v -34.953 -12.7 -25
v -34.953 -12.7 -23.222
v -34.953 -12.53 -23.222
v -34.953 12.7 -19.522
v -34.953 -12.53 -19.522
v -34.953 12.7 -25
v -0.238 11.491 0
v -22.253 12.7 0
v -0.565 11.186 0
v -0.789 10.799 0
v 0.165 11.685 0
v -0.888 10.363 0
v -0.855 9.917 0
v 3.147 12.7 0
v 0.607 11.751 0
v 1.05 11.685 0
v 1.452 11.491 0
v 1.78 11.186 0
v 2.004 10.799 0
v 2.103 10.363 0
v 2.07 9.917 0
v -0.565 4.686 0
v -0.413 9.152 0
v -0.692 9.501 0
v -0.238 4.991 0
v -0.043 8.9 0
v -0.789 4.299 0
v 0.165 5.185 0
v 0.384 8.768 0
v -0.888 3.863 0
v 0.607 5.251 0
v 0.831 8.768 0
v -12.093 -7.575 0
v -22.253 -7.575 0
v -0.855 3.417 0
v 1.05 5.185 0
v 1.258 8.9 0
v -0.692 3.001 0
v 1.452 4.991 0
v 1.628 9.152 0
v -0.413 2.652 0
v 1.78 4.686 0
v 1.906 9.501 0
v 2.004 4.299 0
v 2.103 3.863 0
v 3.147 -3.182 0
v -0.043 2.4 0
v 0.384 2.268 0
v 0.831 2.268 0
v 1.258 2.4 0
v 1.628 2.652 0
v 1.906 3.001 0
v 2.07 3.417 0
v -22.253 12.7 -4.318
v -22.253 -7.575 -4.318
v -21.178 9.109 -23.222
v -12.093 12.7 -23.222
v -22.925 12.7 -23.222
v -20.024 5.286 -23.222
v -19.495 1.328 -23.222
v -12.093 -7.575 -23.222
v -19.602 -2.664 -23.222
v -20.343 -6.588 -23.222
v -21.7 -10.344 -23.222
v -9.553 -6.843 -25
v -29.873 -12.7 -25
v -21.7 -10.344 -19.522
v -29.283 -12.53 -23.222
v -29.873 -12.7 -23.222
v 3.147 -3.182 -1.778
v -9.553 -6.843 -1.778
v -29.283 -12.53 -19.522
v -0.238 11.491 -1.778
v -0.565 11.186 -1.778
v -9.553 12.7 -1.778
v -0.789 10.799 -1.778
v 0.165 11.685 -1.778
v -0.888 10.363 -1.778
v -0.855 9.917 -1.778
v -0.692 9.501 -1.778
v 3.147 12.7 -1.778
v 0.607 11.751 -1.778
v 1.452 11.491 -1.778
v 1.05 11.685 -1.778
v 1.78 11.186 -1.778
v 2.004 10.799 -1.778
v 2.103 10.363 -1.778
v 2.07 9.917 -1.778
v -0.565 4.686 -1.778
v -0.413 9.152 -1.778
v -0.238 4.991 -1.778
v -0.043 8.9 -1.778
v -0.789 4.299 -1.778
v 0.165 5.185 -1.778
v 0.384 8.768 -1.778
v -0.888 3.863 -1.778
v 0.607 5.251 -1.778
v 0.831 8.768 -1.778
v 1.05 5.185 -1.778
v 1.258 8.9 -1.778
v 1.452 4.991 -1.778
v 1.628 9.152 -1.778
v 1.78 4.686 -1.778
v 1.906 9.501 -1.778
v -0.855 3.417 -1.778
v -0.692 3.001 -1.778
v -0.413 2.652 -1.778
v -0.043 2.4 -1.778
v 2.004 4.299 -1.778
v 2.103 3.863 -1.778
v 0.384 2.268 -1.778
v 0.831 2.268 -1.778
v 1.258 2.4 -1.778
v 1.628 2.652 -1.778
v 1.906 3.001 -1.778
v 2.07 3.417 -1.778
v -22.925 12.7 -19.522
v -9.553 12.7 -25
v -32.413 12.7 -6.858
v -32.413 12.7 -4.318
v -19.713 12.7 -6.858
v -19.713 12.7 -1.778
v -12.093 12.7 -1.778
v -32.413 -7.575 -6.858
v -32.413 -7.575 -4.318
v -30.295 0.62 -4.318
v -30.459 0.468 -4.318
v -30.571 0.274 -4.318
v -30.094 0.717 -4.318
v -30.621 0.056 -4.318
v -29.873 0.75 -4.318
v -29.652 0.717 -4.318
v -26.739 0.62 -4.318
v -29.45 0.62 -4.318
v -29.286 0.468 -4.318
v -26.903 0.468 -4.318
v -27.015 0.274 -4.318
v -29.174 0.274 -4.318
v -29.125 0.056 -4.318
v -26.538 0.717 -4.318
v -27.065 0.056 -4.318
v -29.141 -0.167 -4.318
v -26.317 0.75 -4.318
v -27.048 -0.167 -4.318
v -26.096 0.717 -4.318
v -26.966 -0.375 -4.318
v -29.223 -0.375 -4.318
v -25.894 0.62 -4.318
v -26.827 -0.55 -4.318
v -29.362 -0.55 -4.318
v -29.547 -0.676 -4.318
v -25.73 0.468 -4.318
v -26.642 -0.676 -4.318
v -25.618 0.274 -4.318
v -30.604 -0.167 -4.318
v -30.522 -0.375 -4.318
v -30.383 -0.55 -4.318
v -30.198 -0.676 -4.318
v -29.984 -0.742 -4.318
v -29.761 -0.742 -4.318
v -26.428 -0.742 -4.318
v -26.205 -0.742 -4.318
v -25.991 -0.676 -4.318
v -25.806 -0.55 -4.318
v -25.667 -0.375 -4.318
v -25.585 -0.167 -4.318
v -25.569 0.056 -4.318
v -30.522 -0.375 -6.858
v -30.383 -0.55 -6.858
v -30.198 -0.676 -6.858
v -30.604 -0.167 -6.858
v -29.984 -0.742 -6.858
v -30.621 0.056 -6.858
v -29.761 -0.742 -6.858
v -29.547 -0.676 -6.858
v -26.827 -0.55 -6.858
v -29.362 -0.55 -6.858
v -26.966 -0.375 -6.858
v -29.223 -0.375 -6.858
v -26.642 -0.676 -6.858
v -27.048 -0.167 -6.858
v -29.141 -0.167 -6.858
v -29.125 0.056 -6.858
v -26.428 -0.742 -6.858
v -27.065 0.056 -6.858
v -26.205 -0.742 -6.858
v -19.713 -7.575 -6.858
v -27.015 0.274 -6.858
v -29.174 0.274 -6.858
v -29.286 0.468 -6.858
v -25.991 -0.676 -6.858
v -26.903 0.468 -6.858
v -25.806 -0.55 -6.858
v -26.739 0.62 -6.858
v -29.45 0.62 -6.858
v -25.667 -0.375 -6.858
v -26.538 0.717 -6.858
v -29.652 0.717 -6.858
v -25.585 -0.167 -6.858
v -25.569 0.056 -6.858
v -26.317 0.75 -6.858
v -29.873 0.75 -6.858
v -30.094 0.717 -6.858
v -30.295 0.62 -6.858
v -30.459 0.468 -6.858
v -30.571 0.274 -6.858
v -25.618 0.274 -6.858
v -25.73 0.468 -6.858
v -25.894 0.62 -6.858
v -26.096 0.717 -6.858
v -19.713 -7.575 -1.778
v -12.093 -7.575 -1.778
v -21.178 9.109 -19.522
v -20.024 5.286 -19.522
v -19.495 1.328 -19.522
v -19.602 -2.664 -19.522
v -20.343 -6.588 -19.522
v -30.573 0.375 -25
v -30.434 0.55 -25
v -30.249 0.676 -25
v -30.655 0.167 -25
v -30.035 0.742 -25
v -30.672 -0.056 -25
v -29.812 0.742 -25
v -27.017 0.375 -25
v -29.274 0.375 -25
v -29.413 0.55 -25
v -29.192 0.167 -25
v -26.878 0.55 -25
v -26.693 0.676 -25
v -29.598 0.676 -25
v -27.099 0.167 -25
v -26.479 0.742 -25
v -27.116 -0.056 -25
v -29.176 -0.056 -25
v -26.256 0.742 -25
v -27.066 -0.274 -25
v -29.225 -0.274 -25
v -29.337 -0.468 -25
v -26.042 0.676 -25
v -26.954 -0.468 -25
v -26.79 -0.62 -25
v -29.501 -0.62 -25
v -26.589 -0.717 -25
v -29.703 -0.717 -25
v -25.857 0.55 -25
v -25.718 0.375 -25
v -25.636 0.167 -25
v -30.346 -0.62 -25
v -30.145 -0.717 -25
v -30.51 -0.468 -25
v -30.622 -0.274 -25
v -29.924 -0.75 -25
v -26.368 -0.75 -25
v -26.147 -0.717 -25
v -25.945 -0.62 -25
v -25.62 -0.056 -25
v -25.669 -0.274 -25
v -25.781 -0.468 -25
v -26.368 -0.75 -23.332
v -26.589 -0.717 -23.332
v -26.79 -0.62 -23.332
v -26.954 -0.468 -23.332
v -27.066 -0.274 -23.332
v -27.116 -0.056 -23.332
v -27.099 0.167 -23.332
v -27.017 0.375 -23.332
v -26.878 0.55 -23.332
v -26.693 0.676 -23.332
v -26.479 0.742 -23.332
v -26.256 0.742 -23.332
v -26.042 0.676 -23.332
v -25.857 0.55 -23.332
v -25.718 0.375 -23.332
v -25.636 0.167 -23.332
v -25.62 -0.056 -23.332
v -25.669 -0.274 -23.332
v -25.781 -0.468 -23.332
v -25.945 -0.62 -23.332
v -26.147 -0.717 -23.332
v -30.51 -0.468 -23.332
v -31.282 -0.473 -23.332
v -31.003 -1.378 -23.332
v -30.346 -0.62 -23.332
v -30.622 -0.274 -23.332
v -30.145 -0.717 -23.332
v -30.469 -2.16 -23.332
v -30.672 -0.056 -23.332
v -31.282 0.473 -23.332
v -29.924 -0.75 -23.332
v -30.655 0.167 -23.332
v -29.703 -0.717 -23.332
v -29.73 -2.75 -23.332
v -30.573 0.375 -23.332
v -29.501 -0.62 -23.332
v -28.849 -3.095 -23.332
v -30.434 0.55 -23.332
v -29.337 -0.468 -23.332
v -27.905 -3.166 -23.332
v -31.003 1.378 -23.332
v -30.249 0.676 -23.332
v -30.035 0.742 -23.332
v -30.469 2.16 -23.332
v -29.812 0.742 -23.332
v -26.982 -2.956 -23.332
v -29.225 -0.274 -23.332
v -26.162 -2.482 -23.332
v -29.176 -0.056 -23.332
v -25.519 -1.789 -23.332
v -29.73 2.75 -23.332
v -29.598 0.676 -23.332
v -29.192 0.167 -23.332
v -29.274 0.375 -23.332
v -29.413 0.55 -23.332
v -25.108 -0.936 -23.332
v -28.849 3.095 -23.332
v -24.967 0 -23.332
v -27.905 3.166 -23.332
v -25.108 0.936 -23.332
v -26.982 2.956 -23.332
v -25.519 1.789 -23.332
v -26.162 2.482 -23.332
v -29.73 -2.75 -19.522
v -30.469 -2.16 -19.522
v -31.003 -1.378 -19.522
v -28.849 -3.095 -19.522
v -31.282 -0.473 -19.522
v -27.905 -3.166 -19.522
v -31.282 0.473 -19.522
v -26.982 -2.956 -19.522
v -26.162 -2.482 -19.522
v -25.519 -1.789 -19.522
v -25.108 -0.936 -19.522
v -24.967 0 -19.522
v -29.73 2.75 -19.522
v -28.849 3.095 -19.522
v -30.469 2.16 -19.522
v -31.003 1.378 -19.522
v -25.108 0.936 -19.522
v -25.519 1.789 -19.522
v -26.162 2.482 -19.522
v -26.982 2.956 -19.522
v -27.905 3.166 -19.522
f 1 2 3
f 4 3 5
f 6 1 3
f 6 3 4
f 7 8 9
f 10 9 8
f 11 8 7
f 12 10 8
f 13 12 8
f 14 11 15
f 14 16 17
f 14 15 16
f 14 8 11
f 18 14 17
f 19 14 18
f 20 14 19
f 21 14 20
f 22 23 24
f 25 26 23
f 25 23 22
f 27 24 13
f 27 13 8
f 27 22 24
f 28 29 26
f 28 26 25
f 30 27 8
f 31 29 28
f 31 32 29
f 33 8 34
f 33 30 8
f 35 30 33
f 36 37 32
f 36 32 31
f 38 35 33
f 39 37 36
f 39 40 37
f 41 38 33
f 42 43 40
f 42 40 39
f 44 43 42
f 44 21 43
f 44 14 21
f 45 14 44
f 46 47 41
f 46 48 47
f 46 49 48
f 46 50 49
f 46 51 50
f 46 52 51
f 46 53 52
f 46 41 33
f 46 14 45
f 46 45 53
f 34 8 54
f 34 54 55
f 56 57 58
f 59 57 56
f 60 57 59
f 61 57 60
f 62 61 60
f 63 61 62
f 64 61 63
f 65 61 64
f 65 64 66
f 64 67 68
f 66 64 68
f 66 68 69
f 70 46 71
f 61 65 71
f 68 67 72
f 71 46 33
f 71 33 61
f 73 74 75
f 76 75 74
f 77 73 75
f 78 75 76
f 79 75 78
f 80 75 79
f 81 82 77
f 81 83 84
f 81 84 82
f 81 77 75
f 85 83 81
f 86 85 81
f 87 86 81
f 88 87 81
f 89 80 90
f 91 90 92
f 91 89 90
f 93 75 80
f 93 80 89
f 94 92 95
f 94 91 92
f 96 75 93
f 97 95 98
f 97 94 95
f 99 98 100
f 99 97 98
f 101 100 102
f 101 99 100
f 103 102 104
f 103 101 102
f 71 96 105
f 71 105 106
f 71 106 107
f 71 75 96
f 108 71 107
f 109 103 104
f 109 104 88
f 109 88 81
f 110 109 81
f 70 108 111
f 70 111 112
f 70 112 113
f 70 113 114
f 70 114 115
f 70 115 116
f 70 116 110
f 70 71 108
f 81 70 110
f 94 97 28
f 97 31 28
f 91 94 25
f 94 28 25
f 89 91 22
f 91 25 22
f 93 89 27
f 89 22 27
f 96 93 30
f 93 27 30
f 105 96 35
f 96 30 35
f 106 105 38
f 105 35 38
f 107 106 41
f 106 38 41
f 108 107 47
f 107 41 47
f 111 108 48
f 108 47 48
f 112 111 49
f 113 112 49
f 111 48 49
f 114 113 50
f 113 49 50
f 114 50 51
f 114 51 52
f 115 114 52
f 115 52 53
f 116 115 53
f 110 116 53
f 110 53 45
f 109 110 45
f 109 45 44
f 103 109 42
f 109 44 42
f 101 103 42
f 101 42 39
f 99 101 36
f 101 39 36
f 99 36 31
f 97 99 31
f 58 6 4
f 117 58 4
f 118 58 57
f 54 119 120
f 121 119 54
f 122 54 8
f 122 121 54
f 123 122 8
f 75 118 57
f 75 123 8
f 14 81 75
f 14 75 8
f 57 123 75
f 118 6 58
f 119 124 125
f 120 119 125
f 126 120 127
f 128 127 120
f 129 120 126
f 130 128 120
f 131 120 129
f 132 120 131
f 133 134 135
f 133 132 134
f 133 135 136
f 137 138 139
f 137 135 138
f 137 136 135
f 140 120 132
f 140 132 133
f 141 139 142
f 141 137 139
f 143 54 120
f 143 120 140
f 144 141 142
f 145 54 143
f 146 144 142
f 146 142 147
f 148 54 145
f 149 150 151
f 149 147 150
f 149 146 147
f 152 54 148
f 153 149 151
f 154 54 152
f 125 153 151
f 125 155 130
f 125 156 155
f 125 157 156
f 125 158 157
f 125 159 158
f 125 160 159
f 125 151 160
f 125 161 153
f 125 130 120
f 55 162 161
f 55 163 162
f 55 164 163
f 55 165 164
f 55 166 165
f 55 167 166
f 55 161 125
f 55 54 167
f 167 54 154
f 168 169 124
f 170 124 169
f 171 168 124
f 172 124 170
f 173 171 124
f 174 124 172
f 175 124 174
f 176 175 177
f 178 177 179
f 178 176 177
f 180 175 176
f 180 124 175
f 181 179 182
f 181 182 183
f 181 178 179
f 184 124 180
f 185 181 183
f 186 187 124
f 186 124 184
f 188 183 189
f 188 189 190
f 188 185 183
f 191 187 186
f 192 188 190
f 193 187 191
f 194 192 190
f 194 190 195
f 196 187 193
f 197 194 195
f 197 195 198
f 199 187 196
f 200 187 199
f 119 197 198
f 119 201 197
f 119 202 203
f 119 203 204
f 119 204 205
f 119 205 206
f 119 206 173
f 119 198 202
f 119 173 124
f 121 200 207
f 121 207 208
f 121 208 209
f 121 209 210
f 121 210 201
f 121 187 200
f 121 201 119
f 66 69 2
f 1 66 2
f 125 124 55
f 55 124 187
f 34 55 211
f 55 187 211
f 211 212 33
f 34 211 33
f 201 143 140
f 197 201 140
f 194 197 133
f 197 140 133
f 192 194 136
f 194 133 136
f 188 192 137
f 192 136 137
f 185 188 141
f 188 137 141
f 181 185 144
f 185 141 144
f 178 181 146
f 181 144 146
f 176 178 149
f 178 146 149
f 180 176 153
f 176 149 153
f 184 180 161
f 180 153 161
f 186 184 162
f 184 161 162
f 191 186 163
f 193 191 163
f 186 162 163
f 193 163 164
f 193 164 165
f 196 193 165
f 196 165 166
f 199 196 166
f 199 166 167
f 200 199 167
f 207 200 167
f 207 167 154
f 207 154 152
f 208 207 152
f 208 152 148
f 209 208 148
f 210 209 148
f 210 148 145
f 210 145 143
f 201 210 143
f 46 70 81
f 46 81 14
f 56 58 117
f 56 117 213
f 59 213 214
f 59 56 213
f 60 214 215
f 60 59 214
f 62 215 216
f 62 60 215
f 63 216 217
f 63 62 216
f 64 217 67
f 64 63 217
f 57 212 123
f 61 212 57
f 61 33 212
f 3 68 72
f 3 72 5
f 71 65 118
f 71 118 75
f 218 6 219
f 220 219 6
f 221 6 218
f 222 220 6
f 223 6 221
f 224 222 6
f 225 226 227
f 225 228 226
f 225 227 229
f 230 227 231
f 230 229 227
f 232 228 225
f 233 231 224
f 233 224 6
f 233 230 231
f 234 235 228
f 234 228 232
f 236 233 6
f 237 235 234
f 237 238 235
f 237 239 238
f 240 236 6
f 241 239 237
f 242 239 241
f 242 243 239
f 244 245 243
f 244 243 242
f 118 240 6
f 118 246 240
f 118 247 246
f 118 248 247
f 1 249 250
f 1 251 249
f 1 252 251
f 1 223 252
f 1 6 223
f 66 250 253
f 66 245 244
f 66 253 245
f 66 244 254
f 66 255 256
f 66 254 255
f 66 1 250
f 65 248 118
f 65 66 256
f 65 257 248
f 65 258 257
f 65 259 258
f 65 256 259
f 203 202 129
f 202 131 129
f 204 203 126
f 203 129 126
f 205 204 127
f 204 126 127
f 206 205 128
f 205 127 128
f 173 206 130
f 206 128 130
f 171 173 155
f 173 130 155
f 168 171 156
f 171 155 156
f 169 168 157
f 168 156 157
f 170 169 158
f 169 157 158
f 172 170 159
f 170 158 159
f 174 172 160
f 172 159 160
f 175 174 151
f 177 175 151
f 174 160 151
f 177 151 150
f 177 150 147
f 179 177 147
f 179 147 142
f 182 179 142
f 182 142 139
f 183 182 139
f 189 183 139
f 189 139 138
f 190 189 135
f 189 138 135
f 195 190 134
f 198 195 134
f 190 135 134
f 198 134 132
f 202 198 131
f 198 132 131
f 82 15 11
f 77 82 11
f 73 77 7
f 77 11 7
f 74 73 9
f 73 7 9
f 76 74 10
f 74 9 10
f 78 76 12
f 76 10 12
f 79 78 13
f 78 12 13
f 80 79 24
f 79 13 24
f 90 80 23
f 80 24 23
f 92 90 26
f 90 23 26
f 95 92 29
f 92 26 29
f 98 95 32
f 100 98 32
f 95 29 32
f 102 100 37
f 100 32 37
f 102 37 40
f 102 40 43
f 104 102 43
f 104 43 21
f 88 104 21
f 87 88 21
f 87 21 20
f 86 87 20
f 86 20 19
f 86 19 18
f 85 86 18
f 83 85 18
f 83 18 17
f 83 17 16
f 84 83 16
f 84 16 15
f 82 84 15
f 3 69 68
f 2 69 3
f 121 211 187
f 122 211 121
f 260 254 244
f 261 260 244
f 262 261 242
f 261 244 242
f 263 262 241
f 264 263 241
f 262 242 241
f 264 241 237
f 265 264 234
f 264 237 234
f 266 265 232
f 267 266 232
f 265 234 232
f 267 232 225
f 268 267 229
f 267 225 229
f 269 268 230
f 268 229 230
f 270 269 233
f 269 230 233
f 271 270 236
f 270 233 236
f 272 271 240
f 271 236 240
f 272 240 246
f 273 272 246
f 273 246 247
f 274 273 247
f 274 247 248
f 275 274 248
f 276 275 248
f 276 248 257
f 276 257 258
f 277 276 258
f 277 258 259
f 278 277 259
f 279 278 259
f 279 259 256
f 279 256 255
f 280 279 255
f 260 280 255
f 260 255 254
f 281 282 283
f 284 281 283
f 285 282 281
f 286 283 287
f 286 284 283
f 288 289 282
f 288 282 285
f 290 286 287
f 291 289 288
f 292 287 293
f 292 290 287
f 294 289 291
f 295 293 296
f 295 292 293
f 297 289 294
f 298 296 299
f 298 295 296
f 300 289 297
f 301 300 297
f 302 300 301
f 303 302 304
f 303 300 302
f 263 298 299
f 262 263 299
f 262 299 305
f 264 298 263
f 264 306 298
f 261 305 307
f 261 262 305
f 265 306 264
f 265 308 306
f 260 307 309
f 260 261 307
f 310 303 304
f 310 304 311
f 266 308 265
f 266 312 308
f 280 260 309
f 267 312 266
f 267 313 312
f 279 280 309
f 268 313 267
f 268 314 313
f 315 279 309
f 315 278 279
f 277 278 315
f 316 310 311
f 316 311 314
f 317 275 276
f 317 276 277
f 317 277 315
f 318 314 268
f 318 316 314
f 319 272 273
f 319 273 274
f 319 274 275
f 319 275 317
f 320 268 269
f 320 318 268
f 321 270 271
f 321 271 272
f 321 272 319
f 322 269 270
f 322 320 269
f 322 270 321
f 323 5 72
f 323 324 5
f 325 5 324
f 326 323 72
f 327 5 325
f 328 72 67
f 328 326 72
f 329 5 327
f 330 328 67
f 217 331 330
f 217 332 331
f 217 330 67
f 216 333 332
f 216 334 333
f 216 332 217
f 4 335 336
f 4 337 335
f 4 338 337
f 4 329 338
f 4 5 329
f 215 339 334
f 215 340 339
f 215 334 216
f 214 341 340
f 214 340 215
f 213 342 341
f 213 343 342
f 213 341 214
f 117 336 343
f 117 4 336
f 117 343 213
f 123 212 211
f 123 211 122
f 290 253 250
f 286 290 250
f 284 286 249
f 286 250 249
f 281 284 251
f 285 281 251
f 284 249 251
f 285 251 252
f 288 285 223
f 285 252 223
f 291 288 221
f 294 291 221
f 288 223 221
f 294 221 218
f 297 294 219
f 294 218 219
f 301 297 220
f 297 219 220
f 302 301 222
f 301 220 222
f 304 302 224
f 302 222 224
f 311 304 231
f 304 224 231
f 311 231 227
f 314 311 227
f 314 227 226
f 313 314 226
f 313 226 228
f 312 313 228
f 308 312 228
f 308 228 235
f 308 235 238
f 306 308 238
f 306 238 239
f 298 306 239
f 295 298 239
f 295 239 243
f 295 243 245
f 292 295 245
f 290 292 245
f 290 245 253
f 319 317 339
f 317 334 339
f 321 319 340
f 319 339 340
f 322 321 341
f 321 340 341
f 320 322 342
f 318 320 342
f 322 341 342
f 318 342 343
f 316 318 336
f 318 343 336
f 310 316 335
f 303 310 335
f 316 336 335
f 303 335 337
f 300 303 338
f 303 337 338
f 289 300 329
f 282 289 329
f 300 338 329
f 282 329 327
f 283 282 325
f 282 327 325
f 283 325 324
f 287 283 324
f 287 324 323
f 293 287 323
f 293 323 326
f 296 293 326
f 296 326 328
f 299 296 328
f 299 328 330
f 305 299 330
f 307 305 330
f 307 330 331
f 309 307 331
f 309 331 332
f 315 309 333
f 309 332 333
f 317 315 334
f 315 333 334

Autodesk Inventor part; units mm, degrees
ref_plane "YZ Plane" through (0, 0, 0) normal (1, 0, 0) x (0, 1, 0)
ref_plane "XZ Plane" through (0, 0, 0) normal (0, 1, 0) x (-1, 0, 0)
ref_plane "XY Plane" through (0, 0, 0) normal (0, 0, 1) x (1, 0, 0)
sketch "Sketch1" plane through (0, 0, 0) normal (0, 1, 0) x (-1, 0, 0)
  line L0 (-3.1474, 0) -> (12.0926, 0)
  line L1 (12.0926, 0) -> (12.0926, -23.222)
  line L2 (12.0926, -23.222) -> (34.9526, -23.222)
  line L3 (34.9526, -25) -> (9.5526, -25)
  line L4 (9.5526, -25) -> (9.5526, -1.778)
  line L5 (9.5526, -1.778) -> (-3.1474, -1.778)
  line L6 (-3.1474, -1.778) -> (-3.1474, 0)
  line L7 (34.9526, -25) -> (34.9526, -23.222)
  dimension "d1" = 1.778
  dimension "d2" = 25
  dimension "d3" = 1.778
  dimension "d5" = 25.4
  dimension "d6" = 2.54
  dimension "d26" = 15.24
extrude "Extrusion1" add sketch "Sketch1" along normal mid plane 25.4
sketch "Sketch2" plane through (-34.9526, 12.7, -23.222) normal (0, 0, 1) x (1, 0, 0)
  arc A0 (12.0273, -25.4) -> (12.0273, 0) centre (-9.5066, -12.7) ccw
  line L0 (0, 0) -> (12.0273, 0)
  line L1 (12.1267, -25.23) -> (0, -25.23)
  line L2 (0, -25.23) -> (0, 0)
  line L3 (11.8723, 0) -> (11.8723, -12.7) construction
  line L4 (11.8723, -12.7) -> (11.8723, -25.4) construction
  line L5 (22.86, -25.4) -> (0, -25.4) construction
  line L6 (11.8723, -12.7) -> (-9.5066, -12.7) construction
  line L7 (0, 0) -> (0, -25.4) construction
  point P0 (34.9526, -12.7)
  dimension "d9" = 50
extrude "Extrusion2" add sketch "Sketch2" along normal blind 3.7
sketch "Sketch3" plane through (3.1474, 12.7, -1.778) normal (0, 0, -1) x (-1, 0, 0)
  line L0 (0, -25.4) -> (0, 0) projected
  line L1 (0, -15.8818) -> (33.02, -25.4)
  line L2 (38.1, -25.4) -> (12.7, -25.4) projected
  line L3 (0, -25.4) -> (0, -15.8818)
  line L4 (0, -25.4) -> (33.02, -25.4)
  point P0 (3.1474, -12.7)
  point P1 (0, 0)
  dimension "d12" = 73.92
  dimension "d13" = 33.02
extrude "Extrusion3" cut sketch "Sketch3" along normal mid plane 76.2
sketch "Sketch4" plane through (3.1474, 12.7, -1.778) normal (0, 0, -1) x (-1, 0, 0)
  line L0 (0, -15.8818) -> (0, -8.9488) construction
  line L1 (0, 0) -> (0, -15.8818) construction
  line L2 (2.54, -8.9488) -> (2.54, -2.4488) construction
  line L3 (0, -8.9488) -> (2.54, -8.9488) construction
  point P0 (3.1474, -12.7)
  dimension "d16" = 6.933
  dimension "d17" = 2.54
  dimension "d18" = 6.5
hole "Hole1" at (0.6074, 3.7512, -1.778) at (0.6074, 10.2512, -1.778) direction (0, 0, 1) diameter 3 end through all
sketch "Sketch5" plane through (-34.9526, 12.7, -19.522) normal (0, 0, 1) x (1, 0, 0)
  circle A0 centre (6.8106, -12.7) radius 3.175
  point P0 (34.9526, -12.7)
  dimension "d28" = 6.35
extrude "Extrusion4" cut sketch "Sketch5" against normal blind 3.81
sketch "Sketch6" plane through (-28.1421, 0, -23.332) normal (0, 0, 1) x (1, 0, 0)
  line L0 (-0.0036, 0) -> (1.7744, 0)
  line L1 (-0.0036, 0) -> (-1.7816, 0)
  point P0 (28.1421, 0)
  dimension "d31" = 1.778
hole "Hole2" at (-29.9236, 0, -23.332) at (-26.3676, 0, -23.332) direction (0, 0, -1) diameter 1.5 end through all
sketch "Sketch7" plane through (-12.0926, 12.7, -23.222) normal (-1, 0, 0) x (0, 0, 1)
  line L0 (23.222, -20.2748) -> (21.444, -20.2748)
  line L1 (21.444, -20.2748) -> (21.444, 0)
  line L2 (21.444, 0) -> (23.222, 0)
  line L3 (23.222, 0) -> (23.222, -20.2748)
  point P0 (23.222, -12.7)
extrude "Extrusion5" add sketch "Sketch7" along normal blind 10.16
sketch "Sketch8" plane through (-12.0926, -7.5748, -1.778) normal (0, 0, -1) x (-1, 0, 0)
  line L0 (0, 20.2748) -> (10.16, 20.2748) projected
  line L1 (10.16, 0) -> (7.62, 0)
  line L2 (7.62, 0) -> (7.62, 20.2748)
  line L3 (7.62, 20.2748) -> (10.16, 20.2748)
  line L4 (10.16, 20.2748) -> (10.16, 0)
  point P0 (-12.0926, 7.5748)
  dimension "d43" = 2.54
extrude "Extrusion6" add sketch "Sketch8" along normal blind 5.08
sketch "Sketch9" plane through (-22.2526, 12.7, -23.222) normal (-1, 0, 0) x (0, 0, 1)
  line L0 (0, -20.2748) -> (21.444, -20.2748) projected
  line L1 (16.364, 0) -> (18.904, 0)
  line L2 (18.904, 0) -> (18.904, -20.2748)
  line L3 (18.904, -20.2748) -> (16.364, -20.2748)
  line L4 (16.364, -20.2748) -> (16.364, 0)
  point P0 (23.222, -12.7)
  dimension "d44" = 2.54
extrude "Extrusion7" add sketch "Sketch9" along normal blind 10.16
sketch "Sketch10" plane through (-12.0926, -7.5748, -6.858) normal (0, 0, -1) x (-1, 0, 0)
  line L0 (16.002, 20.2748) -> (16.002, 7.5748)
  line L1 (16.002, 7.5748) -> (14.224, 7.5748)
  line L2 (7.62, 20.2748) -> (16.002, 20.2748) construction
  line L3 (7.62, 20.2748) -> (7.62, 0) construction
  line L4 (16.002, 7.5748) -> (17.78, 7.5748)
  point P0 (-12.0926, 7.5748)
  point P1 (20.32, 20.2748)
  dimension "d47" = 1.778
  dimension "d48" = 8.382
  dimension "d49" = 12.7
hole "Hole3" at (-26.3166, 0, -6.858) at (-29.8726, 0, -6.858) direction (0, 0, 1) diameter 1.5 end through all
properties part number "Encoder Mount v2"
